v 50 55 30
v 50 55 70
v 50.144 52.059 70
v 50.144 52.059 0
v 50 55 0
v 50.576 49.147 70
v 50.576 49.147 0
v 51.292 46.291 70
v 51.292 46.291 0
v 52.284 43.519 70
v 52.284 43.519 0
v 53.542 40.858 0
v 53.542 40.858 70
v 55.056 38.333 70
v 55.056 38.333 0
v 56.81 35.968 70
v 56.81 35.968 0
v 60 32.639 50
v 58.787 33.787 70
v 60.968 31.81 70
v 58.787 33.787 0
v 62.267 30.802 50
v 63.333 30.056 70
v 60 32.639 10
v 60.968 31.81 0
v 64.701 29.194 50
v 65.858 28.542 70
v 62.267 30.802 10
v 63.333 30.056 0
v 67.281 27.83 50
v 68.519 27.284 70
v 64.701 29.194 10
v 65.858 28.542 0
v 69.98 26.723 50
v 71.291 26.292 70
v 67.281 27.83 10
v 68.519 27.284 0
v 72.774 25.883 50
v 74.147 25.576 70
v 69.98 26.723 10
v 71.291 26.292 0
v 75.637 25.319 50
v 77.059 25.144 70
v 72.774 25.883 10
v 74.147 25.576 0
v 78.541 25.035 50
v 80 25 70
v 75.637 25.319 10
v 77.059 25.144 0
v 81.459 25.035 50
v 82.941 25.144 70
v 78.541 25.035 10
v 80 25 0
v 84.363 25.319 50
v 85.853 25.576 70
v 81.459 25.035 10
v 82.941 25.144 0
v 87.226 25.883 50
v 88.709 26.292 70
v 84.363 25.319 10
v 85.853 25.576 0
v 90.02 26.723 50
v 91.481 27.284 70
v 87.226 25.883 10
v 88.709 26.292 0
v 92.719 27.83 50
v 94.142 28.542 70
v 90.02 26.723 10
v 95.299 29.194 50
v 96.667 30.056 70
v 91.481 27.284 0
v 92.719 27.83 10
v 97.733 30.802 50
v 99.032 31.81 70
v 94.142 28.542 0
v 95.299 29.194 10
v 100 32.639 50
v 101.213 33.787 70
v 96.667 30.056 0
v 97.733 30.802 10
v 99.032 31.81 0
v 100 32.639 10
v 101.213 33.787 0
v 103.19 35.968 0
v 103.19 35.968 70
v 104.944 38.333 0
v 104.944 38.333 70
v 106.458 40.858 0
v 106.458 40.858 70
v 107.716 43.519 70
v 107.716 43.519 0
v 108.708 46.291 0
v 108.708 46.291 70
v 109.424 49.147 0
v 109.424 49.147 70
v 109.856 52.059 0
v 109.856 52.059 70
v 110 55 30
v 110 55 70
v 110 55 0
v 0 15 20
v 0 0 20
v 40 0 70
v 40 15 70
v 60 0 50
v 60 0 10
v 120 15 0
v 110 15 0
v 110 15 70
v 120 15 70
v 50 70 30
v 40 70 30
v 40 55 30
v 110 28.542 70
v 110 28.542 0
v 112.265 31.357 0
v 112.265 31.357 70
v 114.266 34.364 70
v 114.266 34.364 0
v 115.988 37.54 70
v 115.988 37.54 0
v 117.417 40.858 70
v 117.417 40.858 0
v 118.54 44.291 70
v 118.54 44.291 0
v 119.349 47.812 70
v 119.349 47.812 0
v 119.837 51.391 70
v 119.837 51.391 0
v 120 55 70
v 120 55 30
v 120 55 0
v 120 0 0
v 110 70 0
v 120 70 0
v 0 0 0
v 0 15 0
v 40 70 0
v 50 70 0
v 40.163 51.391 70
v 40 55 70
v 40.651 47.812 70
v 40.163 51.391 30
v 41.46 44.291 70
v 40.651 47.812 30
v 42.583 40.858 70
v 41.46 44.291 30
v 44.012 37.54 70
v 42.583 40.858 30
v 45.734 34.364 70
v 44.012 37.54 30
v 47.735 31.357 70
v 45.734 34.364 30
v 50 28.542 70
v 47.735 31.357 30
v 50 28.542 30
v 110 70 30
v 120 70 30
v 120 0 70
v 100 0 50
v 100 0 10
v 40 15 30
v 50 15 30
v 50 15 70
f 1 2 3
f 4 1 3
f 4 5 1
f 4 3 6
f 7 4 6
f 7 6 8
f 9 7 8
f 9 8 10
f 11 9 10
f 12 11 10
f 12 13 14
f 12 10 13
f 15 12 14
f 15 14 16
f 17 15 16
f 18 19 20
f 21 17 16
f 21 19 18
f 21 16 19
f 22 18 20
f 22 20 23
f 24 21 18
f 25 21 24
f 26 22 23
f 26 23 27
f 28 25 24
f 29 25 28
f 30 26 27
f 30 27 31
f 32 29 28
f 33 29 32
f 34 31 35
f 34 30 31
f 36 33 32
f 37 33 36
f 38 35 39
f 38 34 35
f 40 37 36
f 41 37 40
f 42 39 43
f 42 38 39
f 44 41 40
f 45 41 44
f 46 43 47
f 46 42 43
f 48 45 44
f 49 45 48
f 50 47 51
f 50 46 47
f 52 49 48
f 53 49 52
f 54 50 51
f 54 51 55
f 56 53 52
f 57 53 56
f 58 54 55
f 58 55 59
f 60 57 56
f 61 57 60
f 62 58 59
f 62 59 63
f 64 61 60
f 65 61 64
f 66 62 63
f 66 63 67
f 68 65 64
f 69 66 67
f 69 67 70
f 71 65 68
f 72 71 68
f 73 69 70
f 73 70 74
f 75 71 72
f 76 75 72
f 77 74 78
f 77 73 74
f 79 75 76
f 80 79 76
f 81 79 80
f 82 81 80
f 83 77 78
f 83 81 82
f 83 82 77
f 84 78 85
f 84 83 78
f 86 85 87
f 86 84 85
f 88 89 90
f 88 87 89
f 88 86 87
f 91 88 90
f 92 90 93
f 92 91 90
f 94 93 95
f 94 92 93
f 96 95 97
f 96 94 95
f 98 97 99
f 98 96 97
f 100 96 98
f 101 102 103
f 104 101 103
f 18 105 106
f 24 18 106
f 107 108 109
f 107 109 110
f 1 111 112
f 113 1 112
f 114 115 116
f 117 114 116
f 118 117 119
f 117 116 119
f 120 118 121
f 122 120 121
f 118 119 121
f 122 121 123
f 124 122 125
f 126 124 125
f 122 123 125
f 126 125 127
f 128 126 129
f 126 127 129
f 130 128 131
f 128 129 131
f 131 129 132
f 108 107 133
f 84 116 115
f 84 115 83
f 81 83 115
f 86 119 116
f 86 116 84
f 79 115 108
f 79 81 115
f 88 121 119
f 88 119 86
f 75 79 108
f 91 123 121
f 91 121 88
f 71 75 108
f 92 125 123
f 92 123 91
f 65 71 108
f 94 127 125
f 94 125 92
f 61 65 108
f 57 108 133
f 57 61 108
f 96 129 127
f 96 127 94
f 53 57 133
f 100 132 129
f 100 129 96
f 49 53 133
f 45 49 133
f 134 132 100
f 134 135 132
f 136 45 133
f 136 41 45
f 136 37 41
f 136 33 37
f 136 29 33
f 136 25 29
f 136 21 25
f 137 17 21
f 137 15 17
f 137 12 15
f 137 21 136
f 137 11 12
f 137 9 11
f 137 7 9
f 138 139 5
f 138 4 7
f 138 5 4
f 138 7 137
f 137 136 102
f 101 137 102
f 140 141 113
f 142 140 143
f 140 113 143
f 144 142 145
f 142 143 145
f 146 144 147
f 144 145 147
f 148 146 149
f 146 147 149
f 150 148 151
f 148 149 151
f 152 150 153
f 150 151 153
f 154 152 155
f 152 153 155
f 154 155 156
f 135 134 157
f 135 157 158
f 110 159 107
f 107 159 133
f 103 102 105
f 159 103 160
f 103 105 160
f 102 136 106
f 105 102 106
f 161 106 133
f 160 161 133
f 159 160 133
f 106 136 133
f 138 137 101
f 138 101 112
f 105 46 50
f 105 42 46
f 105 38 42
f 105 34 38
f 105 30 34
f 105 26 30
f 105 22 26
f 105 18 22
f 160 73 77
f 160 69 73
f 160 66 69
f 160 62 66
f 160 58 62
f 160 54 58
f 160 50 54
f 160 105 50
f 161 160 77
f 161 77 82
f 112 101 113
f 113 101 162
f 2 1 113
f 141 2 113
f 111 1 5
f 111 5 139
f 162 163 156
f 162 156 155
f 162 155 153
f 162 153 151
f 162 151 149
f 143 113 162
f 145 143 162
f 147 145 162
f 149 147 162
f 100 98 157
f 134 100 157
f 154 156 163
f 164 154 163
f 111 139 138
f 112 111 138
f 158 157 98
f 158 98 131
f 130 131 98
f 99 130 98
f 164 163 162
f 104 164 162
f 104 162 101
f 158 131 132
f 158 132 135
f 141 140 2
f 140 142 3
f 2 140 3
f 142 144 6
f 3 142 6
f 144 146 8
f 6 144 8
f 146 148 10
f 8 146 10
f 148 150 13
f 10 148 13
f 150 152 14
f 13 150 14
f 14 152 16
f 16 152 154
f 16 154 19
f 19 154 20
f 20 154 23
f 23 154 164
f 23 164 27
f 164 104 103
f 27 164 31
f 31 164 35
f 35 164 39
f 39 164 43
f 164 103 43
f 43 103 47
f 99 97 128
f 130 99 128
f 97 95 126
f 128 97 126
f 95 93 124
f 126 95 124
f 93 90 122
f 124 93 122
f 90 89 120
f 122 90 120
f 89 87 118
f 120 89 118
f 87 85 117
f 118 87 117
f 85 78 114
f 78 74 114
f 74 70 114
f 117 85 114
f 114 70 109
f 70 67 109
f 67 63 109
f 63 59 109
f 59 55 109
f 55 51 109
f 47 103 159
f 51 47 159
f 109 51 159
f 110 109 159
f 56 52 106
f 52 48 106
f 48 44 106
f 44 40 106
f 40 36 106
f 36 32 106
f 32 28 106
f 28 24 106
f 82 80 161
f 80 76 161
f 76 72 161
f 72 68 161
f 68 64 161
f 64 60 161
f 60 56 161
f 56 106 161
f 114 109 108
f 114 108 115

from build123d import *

# Parameters (mm, degrees)
BOSS_EXTRUDE1_DEPTH     = 15
BOSS_EXTRUDE2_DEPTH     = 70
SKETCH3_W               = 10
SKETCH3_H               = 15
BOSS_EXTRUDE3_DEPTH     = 30
CUT_EXTRUDE1_DEPTH      = 156.563491861
CUT_EXTRUDE1_DEPTH_BACK = 156.563491861
CUT_EXTRUDE2_DEPTH      = 156.563491861
CUT_EXTRUDE2_DEPTH_BACK = 156.563491861
SKETCH5_W               = 40
SKETCH5_H               = 40
BOSS_EXTRUDE4_DEPTH     = 30
CUT_EXTRUDE3_START      = 15
CUT_EXTRUDE3_DEPTH      = 60


with BuildPart() as part:
    # Sketch1 → Boss-Extrude1 (new body)
    with BuildSketch(Plane(origin=(0, 0, 0), x_dir=(1, 0, 0), z_dir=(0, 1, 0))):
        Polygon((0, 0), (0, -20), (40, -70), (120, -70), (120, 0), align=None)
    extrude(amount=BOSS_EXTRUDE1_DEPTH)

    # Sketch2 → Boss-Extrude2 (add)
    with BuildSketch(Plane.XY):
        with BuildLine():
            Line((50, 15), (110, 15))
            Line((110, 15), (110, 28.542486889))
            ThreePointArc((110, 28.542486889), (117.416573868, 40.857864376), (120, 55))
            Line((120, 55), (40, 55))
            ThreePointArc((40, 55), (42.583426132, 40.857864376), (50, 28.542486889))
            Line((50, 28.542486889), (50, 15))
        make_face()
    extrude(amount=BOSS_EXTRUDE2_DEPTH)

    # Sketch3 → Boss-Extrude3 (add)
    with BuildSketch(Plane.XY):
        with Locations((115, 62.5)):
            Rectangle(SKETCH3_W, SKETCH3_H)
    boss_extrude3 = extrude(amount=BOSS_EXTRUDE3_DEPTH)

    # Mirror1: Boss-Extrude3 across plane
    add(boss_extrude3.mirror(Plane(origin=(80, 0, 0), x_dir=(0, 0, 1), z_dir=(1, 0, 0))))

    # Sketch4 → Cut-Extrude1 (cut, two sides: drawn at the far end of the back side and taken through both)
    with BuildSketch(Plane.XY.offset(-CUT_EXTRUDE1_DEPTH_BACK)):
        with BuildLine():
            Line((50, 72), (50, 55))
            ThreePointArc((50, 55), (80, 25), (110, 55))
            Line((110, 55), (110, 72))
            Line((110, 72), (50, 72))
        make_face()
    extrude(amount=CUT_EXTRUDE1_DEPTH + CUT_EXTRUDE1_DEPTH_BACK, mode=Mode.SUBTRACT)

    # Sketch5 → Cut-Extrude2 (cut, two sides: drawn at the far end of the back side and taken through both)
    with BuildSketch(Plane(origin=(0, 0, 0), x_dir=(1, 0, 0), z_dir=(0, 1, 0)).offset(-CUT_EXTRUDE2_DEPTH_BACK)):
        with Locations((80, -30)):
            Rectangle(SKETCH5_W, SKETCH5_H)
    extrude(amount=CUT_EXTRUDE2_DEPTH + CUT_EXTRUDE2_DEPTH_BACK, mode=Mode.SUBTRACT)

    # Sketch6 → Boss-Extrude4 (add)
    with BuildSketch(Plane.XY):
        Polygon((0, 15), (40, 70), (50, 70), (50, 15), align=None)
    extrude(amount=BOSS_EXTRUDE4_DEPTH)

    # Sketch7 → Cut-Extrude3 (cut)
    with BuildSketch(Plane(origin=(0, 0, 0), x_dir=(1, 0, 0), z_dir=(0, 1, 0)).offset(CUT_EXTRUDE3_START)):
        Polygon((0, -20), (40, -30), (0, -30), align=None)
    extrude(amount=CUT_EXTRUDE3_DEPTH, mode=Mode.SUBTRACT)


solid = part.part
